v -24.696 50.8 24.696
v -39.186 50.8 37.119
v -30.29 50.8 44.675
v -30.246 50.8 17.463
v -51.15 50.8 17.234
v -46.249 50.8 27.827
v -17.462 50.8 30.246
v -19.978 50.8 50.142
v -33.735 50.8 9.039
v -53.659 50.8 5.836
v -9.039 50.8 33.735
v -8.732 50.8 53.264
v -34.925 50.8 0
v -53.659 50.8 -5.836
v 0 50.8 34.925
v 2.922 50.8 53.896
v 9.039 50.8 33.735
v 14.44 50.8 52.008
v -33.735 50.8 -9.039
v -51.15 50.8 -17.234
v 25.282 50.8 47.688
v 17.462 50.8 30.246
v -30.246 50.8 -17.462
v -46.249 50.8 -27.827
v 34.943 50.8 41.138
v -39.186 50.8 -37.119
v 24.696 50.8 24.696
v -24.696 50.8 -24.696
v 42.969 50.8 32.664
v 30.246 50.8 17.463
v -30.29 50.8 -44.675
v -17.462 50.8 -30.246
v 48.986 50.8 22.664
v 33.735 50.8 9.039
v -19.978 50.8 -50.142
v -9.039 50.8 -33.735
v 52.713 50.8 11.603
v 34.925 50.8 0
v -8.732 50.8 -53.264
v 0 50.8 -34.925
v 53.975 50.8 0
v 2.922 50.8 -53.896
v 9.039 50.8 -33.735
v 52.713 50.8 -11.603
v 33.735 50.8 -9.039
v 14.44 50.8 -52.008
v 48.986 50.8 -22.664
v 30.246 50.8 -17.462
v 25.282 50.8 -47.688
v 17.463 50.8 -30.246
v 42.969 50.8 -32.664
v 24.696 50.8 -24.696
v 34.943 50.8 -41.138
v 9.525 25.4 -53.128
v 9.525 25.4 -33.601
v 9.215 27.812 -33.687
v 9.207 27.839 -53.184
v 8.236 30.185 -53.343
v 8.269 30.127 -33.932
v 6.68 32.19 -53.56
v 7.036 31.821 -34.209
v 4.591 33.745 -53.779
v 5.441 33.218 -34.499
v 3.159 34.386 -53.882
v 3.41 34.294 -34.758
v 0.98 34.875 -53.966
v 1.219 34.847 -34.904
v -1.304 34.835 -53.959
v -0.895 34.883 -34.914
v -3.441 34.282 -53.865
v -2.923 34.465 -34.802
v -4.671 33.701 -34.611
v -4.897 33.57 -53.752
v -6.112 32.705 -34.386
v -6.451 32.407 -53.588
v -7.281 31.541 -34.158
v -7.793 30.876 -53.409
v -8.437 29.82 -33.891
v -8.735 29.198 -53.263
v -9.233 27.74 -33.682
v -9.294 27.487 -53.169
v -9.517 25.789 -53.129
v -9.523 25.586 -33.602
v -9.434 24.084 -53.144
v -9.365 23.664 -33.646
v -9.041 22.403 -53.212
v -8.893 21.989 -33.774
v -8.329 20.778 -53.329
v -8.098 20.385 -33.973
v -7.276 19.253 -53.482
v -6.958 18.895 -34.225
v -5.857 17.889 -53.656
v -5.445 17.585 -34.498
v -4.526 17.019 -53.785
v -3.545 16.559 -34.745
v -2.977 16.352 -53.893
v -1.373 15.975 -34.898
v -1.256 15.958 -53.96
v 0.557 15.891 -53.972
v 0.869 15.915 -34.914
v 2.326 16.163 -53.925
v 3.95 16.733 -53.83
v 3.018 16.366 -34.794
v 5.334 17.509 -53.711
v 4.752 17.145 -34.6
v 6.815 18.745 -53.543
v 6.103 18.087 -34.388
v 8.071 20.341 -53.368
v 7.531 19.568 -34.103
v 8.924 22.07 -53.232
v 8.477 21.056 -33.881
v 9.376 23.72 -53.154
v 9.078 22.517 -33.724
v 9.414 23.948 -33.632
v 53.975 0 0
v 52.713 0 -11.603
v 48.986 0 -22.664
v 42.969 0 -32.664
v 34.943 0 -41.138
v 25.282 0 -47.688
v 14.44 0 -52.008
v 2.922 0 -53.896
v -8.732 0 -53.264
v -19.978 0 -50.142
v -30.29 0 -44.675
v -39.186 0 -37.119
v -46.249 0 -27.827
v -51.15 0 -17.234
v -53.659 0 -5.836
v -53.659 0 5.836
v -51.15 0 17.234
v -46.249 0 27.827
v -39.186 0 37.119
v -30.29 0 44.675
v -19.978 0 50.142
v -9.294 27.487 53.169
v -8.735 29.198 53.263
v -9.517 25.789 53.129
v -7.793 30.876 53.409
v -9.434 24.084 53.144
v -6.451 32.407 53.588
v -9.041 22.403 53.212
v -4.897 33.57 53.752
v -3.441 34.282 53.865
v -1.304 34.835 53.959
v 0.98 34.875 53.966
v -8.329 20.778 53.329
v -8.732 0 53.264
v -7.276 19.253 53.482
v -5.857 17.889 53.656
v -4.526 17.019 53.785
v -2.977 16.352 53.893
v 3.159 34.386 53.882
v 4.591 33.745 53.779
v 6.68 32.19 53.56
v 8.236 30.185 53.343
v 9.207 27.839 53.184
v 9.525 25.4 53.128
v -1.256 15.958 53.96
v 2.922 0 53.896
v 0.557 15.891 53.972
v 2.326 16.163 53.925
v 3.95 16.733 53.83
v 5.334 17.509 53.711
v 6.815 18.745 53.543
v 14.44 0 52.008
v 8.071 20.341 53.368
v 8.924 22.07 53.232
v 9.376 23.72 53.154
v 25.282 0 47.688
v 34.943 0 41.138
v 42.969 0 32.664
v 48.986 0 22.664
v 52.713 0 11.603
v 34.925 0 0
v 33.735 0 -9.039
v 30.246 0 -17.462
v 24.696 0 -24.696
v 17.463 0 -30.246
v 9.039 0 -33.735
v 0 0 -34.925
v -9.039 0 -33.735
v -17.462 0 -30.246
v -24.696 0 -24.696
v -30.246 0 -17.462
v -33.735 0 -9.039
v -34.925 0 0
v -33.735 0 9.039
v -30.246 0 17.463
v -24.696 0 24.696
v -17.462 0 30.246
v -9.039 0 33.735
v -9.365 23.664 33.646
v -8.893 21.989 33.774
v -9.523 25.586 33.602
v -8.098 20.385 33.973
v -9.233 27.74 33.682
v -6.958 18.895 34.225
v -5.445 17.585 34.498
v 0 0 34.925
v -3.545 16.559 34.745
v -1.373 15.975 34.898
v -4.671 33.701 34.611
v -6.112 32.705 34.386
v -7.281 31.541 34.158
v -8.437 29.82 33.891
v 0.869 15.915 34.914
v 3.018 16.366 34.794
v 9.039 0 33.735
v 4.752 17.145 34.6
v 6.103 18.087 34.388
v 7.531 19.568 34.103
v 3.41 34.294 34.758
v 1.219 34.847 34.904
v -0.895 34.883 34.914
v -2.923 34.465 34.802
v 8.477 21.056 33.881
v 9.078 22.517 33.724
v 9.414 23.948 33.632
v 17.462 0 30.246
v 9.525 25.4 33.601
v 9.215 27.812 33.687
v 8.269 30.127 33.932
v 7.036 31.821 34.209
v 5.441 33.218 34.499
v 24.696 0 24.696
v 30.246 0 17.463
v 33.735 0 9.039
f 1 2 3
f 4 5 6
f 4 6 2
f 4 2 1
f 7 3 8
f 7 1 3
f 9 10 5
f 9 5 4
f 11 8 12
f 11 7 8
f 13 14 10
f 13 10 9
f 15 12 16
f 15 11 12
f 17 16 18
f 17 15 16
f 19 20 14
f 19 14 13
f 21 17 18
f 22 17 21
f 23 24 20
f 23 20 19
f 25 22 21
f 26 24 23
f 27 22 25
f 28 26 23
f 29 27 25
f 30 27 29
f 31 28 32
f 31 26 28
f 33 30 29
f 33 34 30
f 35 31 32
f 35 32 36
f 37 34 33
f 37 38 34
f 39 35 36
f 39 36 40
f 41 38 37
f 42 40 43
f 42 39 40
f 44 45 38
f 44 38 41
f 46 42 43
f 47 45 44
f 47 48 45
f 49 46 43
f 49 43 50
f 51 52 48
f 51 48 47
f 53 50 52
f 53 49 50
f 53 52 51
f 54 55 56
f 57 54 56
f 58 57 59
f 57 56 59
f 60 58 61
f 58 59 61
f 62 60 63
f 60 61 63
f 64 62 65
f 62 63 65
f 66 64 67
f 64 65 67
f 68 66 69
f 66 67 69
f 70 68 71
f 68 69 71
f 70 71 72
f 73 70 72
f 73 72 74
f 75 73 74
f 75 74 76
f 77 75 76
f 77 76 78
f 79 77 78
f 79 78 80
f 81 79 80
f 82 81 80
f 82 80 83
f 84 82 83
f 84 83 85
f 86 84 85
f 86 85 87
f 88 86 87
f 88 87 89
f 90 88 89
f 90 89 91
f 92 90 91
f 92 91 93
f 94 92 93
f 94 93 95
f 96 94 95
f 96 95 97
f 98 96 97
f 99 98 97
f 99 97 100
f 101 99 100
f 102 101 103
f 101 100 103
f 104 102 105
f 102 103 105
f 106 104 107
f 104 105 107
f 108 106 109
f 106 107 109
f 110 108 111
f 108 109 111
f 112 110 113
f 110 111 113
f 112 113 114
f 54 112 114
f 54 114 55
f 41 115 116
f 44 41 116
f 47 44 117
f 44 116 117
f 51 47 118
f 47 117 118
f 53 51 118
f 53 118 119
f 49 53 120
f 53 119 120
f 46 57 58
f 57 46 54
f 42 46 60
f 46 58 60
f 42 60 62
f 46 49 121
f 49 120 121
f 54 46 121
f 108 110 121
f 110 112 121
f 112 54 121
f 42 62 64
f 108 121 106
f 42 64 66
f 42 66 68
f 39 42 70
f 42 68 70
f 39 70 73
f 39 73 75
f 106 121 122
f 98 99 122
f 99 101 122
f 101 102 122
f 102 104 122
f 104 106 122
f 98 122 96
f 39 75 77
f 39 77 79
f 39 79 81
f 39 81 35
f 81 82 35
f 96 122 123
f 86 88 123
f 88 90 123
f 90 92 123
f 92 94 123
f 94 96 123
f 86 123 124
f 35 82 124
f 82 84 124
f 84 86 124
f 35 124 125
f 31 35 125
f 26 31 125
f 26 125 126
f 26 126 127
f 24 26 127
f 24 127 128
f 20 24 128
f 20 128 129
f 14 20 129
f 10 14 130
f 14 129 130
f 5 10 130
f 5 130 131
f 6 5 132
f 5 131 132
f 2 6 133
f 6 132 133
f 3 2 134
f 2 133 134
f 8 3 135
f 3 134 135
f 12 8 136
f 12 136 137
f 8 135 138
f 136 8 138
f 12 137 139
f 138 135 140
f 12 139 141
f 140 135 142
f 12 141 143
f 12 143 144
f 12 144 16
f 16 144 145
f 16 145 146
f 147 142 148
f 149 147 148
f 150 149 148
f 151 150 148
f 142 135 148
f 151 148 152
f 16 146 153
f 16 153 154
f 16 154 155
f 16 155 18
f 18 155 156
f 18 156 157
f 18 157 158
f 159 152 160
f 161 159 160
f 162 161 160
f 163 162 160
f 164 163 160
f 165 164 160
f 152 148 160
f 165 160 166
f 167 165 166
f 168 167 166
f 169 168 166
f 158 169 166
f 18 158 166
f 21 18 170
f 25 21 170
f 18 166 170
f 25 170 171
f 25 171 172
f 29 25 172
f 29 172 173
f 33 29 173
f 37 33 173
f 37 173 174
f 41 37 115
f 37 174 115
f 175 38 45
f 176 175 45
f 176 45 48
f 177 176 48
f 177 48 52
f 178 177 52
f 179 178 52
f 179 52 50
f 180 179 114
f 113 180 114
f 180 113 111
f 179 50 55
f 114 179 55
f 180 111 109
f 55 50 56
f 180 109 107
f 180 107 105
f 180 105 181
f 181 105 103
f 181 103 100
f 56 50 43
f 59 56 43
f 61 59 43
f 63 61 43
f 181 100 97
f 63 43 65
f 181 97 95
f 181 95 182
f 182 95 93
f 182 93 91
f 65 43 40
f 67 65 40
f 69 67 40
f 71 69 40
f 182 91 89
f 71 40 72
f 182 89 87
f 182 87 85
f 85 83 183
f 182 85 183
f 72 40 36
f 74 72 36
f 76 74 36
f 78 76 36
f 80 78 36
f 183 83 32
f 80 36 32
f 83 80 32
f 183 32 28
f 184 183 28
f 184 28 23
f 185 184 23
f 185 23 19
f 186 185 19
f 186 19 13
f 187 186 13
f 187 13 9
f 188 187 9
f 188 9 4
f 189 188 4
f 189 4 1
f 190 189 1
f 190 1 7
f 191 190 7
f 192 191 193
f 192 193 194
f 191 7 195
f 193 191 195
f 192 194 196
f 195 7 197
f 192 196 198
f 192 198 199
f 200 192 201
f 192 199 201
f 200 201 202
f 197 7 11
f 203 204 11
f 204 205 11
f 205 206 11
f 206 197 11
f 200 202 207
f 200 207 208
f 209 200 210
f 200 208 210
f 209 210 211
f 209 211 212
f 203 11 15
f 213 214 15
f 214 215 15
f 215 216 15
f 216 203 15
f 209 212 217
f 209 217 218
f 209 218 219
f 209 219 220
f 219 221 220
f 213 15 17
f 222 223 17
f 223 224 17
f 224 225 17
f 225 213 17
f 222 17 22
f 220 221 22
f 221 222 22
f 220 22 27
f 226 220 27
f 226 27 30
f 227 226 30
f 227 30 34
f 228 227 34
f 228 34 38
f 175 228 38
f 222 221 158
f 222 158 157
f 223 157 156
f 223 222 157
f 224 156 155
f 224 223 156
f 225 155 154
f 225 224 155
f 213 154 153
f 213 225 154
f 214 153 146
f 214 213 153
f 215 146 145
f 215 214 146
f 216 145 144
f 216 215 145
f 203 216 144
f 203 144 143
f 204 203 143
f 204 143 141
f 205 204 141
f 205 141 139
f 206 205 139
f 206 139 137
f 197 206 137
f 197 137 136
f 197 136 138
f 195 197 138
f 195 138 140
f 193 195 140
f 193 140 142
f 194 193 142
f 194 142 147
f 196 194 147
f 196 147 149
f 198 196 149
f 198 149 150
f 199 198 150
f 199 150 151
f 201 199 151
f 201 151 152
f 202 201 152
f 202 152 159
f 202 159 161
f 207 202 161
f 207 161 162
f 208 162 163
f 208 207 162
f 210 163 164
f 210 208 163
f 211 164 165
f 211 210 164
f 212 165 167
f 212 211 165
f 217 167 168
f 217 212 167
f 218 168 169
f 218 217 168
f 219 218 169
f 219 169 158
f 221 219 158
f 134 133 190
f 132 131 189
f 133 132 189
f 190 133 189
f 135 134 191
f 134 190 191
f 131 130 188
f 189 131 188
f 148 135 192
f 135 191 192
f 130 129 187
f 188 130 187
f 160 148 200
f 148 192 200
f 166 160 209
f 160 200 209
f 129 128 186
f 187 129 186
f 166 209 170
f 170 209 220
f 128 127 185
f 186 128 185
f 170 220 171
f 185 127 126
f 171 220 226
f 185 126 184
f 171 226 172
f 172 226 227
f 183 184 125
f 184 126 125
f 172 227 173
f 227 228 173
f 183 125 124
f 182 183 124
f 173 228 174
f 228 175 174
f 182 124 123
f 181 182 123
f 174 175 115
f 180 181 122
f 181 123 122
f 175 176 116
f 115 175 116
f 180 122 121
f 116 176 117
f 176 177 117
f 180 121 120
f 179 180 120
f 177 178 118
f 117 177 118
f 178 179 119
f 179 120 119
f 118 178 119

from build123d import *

# Parameters (mm, degrees)
SKETCH1_R               = 53.975
BOSS_EXTRUDE1_DEPTH     = 50.8
SKETCH2_R               = 34.925
CUT_EXTRUDE1_DEPTH      = 51.8
SKETCH4_R               = 9.525
CUT_EXTRUDE3_DEPTH      = 54.975
CUT_EXTRUDE3_DEPTH_BACK = 54.975


with BuildPart() as part:
    # Sketch1 → Boss-Extrude1 (new body)
    with BuildSketch(Plane(origin=(0, 0, 0), x_dir=(1, 0, 0), z_dir=(0, 1, 0))):
        Circle(SKETCH1_R)
    extrude(amount=BOSS_EXTRUDE1_DEPTH)

    # Sketch2 → Cut-Extrude1 (cut, through all)
    with BuildSketch(Plane(origin=(0, 50.8, 0), x_dir=(1, 0, 0), z_dir=(0, 1, 0))):
        Circle(SKETCH2_R)
    extrude(amount=-CUT_EXTRUDE1_DEPTH, mode=Mode.SUBTRACT)

    # Sketch4 → Cut-Extrude3 (cut, two sides)
    with BuildSketch(Plane.XY) as cut_extrude3_sk:
        with Locations((0, 25.4)):
            Circle(SKETCH4_R)
    extrude(amount=CUT_EXTRUDE3_DEPTH, mode=Mode.SUBTRACT)
    extrude(cut_extrude3_sk.sketch, amount=-CUT_EXTRUDE3_DEPTH_BACK, mode=Mode.SUBTRACT)


solid = part.part
